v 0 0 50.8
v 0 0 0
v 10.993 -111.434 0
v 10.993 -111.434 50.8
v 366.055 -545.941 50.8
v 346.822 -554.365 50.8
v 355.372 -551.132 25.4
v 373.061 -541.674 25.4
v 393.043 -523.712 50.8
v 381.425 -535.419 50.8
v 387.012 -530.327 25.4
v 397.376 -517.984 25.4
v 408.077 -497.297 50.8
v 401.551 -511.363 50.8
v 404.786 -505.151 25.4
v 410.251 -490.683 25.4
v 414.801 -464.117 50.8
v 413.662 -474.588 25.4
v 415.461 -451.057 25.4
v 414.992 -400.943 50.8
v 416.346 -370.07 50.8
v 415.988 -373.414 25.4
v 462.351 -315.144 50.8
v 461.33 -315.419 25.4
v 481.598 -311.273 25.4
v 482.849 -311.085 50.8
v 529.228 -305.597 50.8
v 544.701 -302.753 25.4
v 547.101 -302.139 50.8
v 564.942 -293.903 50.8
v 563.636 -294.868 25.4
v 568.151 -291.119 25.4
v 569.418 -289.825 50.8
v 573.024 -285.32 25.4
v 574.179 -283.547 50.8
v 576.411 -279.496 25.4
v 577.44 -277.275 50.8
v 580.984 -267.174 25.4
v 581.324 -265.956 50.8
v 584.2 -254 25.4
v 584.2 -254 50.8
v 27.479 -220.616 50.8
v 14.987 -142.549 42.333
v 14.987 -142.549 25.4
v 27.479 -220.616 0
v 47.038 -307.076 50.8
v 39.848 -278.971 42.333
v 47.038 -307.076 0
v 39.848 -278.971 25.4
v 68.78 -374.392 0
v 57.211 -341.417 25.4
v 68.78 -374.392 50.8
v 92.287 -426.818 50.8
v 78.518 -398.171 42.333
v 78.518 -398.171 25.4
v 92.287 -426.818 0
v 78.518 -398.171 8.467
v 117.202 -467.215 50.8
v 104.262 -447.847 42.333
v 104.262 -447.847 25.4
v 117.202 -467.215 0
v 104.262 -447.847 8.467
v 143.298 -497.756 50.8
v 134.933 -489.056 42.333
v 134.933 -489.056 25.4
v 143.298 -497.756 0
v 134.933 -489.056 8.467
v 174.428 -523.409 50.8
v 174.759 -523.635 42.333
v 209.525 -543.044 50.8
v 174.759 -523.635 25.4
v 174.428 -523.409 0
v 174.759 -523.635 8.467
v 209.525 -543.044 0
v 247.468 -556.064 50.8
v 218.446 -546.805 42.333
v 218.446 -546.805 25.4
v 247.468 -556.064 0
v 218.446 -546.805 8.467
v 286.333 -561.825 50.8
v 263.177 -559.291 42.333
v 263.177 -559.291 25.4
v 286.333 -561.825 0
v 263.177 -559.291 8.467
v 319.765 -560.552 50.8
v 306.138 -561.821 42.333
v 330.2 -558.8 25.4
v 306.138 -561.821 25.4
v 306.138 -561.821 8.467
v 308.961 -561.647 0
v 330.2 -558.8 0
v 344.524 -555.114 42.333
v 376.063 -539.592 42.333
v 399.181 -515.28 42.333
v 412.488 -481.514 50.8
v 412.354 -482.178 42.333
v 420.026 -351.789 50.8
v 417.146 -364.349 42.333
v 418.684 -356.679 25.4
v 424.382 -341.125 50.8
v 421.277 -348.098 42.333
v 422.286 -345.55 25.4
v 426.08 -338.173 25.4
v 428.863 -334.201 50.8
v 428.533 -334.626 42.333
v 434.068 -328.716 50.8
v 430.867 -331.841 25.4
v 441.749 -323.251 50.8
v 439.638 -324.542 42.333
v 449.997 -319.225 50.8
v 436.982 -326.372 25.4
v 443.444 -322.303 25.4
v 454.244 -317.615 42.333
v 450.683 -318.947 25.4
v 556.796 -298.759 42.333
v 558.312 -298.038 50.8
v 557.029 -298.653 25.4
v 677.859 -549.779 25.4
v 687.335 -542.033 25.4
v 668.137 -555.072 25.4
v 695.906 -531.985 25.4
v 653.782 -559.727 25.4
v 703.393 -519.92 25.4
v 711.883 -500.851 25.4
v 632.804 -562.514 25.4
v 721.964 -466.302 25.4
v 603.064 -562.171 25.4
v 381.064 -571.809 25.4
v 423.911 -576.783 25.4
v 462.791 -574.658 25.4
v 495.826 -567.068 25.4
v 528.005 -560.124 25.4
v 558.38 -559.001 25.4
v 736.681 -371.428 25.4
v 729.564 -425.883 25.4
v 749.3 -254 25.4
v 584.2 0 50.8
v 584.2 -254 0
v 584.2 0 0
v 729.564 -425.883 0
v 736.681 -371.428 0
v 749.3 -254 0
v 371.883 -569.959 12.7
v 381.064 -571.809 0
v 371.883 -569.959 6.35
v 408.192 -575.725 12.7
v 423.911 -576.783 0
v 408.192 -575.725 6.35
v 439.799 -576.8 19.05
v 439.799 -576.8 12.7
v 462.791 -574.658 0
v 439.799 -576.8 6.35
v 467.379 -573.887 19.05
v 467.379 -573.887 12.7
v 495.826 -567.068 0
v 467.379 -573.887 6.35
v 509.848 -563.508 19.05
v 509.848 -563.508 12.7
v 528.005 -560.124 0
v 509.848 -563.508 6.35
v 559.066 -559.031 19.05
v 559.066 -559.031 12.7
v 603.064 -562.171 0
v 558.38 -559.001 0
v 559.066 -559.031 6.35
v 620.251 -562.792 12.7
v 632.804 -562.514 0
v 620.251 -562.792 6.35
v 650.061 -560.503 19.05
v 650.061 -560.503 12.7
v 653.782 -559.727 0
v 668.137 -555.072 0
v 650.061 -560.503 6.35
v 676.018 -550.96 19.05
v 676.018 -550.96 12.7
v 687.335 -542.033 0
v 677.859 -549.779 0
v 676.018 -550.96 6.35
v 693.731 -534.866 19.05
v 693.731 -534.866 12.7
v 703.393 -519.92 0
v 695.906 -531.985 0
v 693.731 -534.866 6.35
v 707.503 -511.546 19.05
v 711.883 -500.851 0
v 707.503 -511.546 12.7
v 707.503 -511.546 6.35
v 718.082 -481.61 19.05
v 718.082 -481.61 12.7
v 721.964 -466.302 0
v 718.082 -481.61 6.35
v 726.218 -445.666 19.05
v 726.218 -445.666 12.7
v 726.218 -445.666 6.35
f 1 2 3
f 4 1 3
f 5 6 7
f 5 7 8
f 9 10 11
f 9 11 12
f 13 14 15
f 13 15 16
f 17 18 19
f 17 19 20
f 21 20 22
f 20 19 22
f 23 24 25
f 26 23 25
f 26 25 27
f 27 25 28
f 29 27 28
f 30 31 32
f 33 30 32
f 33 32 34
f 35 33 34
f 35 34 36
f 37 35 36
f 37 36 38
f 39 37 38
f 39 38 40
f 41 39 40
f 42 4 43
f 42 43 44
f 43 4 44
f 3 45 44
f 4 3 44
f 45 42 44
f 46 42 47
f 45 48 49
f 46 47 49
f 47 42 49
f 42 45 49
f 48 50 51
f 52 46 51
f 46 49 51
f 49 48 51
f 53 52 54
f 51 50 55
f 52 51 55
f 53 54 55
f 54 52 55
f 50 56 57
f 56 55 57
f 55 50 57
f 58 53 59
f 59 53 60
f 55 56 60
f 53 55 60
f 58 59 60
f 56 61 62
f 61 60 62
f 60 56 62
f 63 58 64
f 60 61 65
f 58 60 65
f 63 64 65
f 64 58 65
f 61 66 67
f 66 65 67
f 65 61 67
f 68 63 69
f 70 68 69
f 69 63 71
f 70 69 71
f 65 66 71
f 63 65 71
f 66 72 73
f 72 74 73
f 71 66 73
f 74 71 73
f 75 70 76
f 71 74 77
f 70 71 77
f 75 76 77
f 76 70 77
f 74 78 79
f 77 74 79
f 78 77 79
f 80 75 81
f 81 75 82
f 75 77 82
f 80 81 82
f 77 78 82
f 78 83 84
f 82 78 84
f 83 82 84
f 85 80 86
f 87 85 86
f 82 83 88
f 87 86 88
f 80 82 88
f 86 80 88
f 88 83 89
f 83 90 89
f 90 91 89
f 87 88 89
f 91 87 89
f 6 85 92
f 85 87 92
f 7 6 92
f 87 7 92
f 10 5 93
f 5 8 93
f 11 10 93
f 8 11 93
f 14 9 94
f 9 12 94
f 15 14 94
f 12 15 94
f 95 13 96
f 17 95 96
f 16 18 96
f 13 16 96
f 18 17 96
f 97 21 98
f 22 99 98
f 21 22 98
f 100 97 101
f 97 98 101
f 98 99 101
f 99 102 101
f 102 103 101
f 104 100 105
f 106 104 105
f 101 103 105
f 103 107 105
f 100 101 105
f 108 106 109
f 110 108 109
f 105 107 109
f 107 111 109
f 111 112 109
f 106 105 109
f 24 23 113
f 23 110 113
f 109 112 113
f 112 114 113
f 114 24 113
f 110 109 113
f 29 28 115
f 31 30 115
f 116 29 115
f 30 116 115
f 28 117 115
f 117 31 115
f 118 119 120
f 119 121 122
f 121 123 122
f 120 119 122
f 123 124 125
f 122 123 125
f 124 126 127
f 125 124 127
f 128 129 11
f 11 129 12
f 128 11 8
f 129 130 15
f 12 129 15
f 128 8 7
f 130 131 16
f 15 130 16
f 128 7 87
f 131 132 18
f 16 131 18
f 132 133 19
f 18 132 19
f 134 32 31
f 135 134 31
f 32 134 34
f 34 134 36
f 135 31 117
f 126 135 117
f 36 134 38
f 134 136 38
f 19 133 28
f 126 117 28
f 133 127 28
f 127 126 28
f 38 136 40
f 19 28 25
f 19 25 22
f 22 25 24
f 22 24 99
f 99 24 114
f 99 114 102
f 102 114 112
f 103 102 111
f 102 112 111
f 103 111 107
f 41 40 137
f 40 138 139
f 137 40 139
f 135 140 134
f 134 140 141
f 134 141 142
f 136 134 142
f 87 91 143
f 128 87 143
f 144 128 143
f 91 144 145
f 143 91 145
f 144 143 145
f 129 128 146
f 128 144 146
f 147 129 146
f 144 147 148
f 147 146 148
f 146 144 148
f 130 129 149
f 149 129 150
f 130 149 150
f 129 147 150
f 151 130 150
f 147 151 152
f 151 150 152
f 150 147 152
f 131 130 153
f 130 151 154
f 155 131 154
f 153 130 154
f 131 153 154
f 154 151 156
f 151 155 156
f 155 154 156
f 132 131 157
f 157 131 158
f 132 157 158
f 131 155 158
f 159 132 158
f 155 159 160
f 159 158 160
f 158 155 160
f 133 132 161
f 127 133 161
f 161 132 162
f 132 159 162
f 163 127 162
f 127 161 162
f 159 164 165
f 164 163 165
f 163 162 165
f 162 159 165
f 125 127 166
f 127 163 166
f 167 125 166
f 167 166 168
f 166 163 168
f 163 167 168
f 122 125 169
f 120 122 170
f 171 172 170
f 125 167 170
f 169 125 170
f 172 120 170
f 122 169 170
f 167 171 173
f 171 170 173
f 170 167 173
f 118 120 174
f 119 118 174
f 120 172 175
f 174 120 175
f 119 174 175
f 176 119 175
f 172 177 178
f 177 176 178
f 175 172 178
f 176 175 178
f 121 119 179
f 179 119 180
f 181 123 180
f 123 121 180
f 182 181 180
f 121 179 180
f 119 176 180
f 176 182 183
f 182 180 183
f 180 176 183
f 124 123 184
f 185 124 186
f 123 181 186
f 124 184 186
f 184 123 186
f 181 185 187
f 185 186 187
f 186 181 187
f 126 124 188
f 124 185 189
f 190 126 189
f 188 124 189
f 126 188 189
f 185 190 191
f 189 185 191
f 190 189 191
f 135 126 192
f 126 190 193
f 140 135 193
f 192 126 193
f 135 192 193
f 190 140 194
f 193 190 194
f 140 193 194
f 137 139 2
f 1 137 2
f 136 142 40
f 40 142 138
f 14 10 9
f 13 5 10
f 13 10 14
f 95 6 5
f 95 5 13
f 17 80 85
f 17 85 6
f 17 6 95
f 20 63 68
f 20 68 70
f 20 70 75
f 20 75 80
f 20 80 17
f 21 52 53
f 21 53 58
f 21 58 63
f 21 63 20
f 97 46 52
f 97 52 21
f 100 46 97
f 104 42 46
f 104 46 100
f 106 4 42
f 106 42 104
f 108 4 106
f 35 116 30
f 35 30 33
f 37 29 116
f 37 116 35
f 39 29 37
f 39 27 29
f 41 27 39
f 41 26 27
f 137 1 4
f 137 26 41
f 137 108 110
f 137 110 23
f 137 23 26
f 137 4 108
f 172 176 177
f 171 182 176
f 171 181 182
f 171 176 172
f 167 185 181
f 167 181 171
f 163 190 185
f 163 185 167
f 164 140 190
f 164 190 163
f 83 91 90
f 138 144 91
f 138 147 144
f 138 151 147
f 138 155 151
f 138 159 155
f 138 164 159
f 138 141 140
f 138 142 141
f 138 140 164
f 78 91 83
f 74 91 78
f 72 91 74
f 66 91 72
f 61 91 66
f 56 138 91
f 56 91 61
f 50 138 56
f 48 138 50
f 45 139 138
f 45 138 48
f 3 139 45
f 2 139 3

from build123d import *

# Parameters (mm, degrees)
F2_DEPTH = 50.8
F3_DEPTH = 25.4


# Not quite as in the source:
# - the dataset's text gives a spline's control points without its knots; the knots are read off the source's solid


with BuildPart() as f2:
    # F0 (on Top) → F2 (new body)
    with BuildSketch(Plane.XY):
        with BuildLine():
            Line((584.2, 0), (0, 0))
            add(Edge.make_bspline(
                [(0, 0), (15.1486947055, -189.218948528), (65.9452547031, -521.1208855176), (331.2736157203, -584.8076926646), (439.4210233355, -494.812023687), (384.6079093416, -293.977624041), (569.828929238, -318.1440119701), (580.1429311177, -272.0586668), (584.2, -254)],
                knots=[0, 0, 0, 0, 0.2870068182, 0.4704907214, 0.6055466033, 0.7629356749, 0.9076890707, 1, 1, 1, 1], degree=3))
            Line((584.2, -254), (584.2, 0))
        make_face()
    extrude(amount=F2_DEPTH)

    # F1 (on Top) → F3 (join)
    with BuildSketch(Plane.XY):
        with BuildLine():
            add(Edge.make_bspline(
                [(330.2, -558.8), (372.9674701378, -550.1118418504), (439.4210233355, -494.812023687), (384.6079093416, -293.977624041), (569.828929238, -318.1440119701), (580.1429311177, -272.0586668), (584.2, -254)],
                knots=[0.4704907214, 0.4704907214, 0.4704907214, 0.4704907214, 0.6055466033, 0.7629356749, 0.9076890707, 1, 1, 1, 1], degree=3))
            add(Edge.make_bspline(
                [(330.2, -558.8), (389.6603919437, -577.5870896762), (465.8574745229, -582.035806053), (541.2894567383, -546.8586607902), (727.1294826657, -594.3131958041), (732.2998279498, -401.9058890127), (749.3, -254)],
                knots=[0, 0, 0, 0, 0.2368976142, 0.4165860366, 0.6473220038, 1, 1, 1, 1], degree=3))
            Line((749.3, -254), (584.2, -254))
        make_face()
    extrude(amount=F3_DEPTH)


solid = f2.part
